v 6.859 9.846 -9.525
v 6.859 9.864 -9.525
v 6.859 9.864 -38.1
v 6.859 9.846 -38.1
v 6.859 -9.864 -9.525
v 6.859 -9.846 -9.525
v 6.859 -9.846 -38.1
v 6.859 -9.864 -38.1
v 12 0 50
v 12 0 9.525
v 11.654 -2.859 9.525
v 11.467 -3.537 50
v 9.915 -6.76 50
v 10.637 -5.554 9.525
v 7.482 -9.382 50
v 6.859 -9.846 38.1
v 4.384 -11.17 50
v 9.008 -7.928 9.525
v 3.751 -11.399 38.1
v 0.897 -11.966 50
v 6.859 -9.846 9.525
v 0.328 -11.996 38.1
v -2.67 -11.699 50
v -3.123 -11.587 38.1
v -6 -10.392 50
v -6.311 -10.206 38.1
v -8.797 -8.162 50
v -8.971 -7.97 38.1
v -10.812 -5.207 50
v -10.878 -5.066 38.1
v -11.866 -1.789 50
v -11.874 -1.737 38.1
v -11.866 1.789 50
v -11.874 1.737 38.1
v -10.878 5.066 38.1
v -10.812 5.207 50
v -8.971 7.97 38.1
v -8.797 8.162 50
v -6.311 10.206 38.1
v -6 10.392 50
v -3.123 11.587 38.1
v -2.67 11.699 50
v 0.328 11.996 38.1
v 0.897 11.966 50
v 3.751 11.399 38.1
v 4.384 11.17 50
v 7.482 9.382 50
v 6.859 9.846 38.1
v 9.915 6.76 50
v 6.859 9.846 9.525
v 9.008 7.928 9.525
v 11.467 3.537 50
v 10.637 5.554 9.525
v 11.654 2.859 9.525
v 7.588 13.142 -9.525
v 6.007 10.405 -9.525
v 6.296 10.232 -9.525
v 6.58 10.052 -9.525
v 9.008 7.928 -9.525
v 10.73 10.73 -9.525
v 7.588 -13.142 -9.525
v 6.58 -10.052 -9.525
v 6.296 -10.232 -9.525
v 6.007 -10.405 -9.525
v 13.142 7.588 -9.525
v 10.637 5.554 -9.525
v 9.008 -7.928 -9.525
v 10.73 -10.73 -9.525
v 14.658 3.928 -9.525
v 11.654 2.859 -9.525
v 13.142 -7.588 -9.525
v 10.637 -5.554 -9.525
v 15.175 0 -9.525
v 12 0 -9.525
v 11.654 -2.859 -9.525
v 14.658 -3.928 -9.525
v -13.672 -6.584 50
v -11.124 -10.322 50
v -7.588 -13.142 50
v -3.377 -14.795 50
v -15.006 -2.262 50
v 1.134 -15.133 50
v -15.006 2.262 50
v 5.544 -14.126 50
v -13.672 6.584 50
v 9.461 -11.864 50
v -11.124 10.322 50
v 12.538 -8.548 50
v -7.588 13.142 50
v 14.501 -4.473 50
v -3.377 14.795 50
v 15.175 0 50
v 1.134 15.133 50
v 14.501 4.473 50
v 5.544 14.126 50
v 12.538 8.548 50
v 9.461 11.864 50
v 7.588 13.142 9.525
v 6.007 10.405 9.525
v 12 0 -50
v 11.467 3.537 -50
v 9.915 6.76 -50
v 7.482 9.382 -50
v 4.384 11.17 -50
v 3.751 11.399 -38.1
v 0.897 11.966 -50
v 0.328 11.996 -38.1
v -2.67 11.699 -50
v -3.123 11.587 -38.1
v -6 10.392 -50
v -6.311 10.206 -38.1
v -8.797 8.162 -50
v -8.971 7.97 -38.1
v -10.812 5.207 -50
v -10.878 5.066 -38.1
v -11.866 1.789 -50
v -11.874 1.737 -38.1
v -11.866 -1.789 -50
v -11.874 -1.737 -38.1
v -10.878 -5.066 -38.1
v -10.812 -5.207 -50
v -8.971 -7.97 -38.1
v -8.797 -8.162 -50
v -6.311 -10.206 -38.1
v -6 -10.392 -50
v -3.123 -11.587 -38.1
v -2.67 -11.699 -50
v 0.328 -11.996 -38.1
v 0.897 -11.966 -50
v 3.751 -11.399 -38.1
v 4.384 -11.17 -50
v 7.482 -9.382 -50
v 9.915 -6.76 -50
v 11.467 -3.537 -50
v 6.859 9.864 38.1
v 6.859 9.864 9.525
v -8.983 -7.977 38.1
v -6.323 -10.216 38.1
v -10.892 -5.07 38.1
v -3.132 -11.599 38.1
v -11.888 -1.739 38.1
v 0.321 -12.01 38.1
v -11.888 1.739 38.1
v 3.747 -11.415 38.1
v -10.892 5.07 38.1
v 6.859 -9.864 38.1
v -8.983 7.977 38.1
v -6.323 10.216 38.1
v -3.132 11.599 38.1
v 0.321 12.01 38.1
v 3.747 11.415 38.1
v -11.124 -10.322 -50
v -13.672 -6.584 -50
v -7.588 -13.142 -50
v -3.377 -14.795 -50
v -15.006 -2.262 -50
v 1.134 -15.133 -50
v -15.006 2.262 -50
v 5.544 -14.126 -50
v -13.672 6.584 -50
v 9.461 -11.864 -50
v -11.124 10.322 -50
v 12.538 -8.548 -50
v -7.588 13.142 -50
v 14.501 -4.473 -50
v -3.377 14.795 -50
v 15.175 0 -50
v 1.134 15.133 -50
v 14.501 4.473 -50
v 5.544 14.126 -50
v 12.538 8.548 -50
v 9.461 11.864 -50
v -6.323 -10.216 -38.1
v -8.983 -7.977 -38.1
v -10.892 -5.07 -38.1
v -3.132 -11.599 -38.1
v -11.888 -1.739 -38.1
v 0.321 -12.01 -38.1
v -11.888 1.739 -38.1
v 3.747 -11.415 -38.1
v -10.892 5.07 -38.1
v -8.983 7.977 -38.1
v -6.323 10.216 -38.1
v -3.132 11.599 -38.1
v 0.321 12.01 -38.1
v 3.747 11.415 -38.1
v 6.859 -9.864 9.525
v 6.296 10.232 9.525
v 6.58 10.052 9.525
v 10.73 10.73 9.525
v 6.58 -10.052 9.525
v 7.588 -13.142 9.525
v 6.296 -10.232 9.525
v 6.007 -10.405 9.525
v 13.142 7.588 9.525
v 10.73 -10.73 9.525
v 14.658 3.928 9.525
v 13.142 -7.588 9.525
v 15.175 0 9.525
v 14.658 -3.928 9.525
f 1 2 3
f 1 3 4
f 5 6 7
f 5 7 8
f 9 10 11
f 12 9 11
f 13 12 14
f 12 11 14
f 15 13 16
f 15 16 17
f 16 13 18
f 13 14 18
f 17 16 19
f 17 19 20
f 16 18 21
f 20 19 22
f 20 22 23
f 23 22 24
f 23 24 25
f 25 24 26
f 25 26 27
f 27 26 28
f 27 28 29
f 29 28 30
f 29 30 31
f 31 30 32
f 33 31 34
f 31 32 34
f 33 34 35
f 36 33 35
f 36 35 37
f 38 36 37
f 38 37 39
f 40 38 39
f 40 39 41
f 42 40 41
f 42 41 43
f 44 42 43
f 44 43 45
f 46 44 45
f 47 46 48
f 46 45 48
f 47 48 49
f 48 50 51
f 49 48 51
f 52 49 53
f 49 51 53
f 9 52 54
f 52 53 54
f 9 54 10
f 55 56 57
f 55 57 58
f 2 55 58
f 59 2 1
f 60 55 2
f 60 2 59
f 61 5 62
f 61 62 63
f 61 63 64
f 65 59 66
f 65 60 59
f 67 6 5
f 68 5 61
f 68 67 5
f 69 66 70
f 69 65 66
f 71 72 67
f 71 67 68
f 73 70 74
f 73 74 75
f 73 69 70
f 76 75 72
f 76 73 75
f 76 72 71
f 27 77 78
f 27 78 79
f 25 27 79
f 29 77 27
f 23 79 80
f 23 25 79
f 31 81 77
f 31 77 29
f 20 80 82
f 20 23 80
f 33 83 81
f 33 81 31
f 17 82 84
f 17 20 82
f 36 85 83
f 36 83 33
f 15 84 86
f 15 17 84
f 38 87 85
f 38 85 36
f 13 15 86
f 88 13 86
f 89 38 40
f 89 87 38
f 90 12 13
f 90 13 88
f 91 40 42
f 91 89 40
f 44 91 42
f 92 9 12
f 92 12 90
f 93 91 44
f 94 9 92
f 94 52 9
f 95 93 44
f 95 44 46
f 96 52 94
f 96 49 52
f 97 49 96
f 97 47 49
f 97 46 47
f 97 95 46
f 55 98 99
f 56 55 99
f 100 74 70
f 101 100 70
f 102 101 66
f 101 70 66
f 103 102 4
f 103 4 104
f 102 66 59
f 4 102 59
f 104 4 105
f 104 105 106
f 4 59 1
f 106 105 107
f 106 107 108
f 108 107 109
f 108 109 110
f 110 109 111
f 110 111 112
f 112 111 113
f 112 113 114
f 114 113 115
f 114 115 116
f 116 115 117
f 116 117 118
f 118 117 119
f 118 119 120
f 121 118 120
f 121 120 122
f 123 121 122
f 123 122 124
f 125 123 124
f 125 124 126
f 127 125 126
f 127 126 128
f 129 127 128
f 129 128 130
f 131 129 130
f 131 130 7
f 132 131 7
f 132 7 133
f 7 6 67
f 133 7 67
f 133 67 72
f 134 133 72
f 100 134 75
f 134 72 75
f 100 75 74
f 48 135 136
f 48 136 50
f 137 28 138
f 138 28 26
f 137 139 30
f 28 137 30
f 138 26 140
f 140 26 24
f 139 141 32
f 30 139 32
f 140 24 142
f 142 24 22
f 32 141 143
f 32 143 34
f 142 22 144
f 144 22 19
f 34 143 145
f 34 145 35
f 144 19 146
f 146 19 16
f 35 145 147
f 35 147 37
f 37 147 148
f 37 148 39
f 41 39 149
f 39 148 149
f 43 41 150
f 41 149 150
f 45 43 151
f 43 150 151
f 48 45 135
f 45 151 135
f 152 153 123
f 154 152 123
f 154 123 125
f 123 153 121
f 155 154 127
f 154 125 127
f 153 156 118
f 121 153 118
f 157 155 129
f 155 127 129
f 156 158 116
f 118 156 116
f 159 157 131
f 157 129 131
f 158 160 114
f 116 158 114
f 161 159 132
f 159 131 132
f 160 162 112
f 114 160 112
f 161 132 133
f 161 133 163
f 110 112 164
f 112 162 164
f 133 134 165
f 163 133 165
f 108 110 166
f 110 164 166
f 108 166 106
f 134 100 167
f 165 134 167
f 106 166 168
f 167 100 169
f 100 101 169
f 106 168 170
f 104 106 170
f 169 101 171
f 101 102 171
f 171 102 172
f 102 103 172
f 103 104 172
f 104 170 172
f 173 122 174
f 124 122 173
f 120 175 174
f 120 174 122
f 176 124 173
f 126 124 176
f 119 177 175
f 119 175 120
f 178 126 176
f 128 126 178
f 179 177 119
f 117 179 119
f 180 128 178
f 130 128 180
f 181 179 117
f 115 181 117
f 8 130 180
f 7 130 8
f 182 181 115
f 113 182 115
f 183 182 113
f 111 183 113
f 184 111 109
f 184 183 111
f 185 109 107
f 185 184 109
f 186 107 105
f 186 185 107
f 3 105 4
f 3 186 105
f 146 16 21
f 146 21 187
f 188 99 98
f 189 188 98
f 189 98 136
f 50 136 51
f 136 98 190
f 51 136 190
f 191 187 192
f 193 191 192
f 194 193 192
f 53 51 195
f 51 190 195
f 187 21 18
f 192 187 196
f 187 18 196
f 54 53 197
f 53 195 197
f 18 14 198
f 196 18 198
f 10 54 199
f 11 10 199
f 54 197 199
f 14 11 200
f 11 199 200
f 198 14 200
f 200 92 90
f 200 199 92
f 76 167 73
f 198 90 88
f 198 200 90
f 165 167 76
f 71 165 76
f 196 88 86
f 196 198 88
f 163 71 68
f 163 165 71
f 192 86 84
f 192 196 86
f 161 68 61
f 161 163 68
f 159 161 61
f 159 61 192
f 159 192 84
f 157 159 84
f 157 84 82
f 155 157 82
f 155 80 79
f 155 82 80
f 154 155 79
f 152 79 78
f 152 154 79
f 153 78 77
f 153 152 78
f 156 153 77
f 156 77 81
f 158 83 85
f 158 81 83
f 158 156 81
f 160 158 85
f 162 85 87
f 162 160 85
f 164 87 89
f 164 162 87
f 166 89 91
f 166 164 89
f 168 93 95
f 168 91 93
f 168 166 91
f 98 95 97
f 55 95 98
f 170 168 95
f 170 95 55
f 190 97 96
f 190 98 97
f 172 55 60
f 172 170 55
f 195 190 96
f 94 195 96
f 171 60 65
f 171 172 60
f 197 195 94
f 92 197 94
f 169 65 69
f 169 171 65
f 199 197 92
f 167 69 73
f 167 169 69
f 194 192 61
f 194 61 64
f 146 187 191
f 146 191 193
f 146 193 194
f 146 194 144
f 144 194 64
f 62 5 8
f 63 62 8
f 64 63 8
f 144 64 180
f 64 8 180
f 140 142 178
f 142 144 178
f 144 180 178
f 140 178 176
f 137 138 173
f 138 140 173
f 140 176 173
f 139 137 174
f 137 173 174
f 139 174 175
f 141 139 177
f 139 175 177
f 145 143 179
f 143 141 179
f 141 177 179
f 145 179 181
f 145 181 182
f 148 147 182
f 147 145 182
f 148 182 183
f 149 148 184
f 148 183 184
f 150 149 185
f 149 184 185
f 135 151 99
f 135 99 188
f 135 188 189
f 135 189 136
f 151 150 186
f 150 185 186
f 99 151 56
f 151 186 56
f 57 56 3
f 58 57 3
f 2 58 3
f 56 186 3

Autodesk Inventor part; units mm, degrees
ref_plane "YZ Plane" through (0, 0, 0) normal (1, 0, 0) x (0, 1, 0)
ref_plane "XZ Plane" through (0, 0, 0) normal (0, 1, 0) x (-1, 0, 0)
ref_plane "XY Plane" through (0, 0, 0) normal (0, 0, 1) x (1, 0, 0)
sketch "Sketch1" plane through (0, 0, 0) normal (0, 0, 1) x (1, 0, 0)
  circle A0 centre (0, 0) radius 12
  circle A1 centre (0, 0) radius 15.175
  dimension "d0" = 24
  dimension "d1" = 3.175
extrude "Extrusion1" add sketch "Sketch1" along normal mid plane 100
sketch "Sketch2" plane through (0, 0, 0) normal (0, 1, 0) x (-1, 0, 0)
  line L0 (15.175, -50) -> (15.175, 50) projected
  line L1 (-12, -50) -> (-12, 50) projected
  line L2 (-15.175, -50) -> (-15.175, 50) projected
  line L3 (15.175, 12.7) -> (15.175, -12.7)
  line L4 (0, -70) -> (0, 70) projected
  line L5 (-12, -50) -> (-12, 50) projected
  line L6 (-12, -9.525) -> (-15.175, -9.525)
  line L7 (-15.175, -9.525) -> (-15.175, 9.525)
  line L8 (-15.175, 9.525) -> (-12, 9.525)
  line L9 (-12, 9.525) -> (-12, -9.525)
  point P0 (0, 0)
  point P1 (12, 0)
  point P2 (-12, 0)
  dimension "d6" = 19.05
revolve "Revolution1" cut sketch "Sketch2" angle 120 mid plane about axis through (0, 0, -10) along (0, 0, 1)
sketch "Sketch4" plane through (0, 0, 0) normal (0, 0, 1) x (1, 0, 0)
  arc A0 (6.8593, 9.8463) -> (6.8593, -9.8463) centre (0, 0) ccw
  arc A1 (6.8593, 9.8636) -> (6.8593, -9.8636) centre (0, 0) ccw
  line L0 (6.8593, 9.8636) -> (6.8593, 9.8463)
  line L1 (6.8593, -9.8463) -> (6.8593, -9.8636)
  dimension "d9" = 24.0284
extrude "Extrusion2" cut sketch "Sketch4" along normal mid plane 76.2
properties part number "DPLX_P033_SG_Viton rubber Cover" material "Rubber, Silicone"
